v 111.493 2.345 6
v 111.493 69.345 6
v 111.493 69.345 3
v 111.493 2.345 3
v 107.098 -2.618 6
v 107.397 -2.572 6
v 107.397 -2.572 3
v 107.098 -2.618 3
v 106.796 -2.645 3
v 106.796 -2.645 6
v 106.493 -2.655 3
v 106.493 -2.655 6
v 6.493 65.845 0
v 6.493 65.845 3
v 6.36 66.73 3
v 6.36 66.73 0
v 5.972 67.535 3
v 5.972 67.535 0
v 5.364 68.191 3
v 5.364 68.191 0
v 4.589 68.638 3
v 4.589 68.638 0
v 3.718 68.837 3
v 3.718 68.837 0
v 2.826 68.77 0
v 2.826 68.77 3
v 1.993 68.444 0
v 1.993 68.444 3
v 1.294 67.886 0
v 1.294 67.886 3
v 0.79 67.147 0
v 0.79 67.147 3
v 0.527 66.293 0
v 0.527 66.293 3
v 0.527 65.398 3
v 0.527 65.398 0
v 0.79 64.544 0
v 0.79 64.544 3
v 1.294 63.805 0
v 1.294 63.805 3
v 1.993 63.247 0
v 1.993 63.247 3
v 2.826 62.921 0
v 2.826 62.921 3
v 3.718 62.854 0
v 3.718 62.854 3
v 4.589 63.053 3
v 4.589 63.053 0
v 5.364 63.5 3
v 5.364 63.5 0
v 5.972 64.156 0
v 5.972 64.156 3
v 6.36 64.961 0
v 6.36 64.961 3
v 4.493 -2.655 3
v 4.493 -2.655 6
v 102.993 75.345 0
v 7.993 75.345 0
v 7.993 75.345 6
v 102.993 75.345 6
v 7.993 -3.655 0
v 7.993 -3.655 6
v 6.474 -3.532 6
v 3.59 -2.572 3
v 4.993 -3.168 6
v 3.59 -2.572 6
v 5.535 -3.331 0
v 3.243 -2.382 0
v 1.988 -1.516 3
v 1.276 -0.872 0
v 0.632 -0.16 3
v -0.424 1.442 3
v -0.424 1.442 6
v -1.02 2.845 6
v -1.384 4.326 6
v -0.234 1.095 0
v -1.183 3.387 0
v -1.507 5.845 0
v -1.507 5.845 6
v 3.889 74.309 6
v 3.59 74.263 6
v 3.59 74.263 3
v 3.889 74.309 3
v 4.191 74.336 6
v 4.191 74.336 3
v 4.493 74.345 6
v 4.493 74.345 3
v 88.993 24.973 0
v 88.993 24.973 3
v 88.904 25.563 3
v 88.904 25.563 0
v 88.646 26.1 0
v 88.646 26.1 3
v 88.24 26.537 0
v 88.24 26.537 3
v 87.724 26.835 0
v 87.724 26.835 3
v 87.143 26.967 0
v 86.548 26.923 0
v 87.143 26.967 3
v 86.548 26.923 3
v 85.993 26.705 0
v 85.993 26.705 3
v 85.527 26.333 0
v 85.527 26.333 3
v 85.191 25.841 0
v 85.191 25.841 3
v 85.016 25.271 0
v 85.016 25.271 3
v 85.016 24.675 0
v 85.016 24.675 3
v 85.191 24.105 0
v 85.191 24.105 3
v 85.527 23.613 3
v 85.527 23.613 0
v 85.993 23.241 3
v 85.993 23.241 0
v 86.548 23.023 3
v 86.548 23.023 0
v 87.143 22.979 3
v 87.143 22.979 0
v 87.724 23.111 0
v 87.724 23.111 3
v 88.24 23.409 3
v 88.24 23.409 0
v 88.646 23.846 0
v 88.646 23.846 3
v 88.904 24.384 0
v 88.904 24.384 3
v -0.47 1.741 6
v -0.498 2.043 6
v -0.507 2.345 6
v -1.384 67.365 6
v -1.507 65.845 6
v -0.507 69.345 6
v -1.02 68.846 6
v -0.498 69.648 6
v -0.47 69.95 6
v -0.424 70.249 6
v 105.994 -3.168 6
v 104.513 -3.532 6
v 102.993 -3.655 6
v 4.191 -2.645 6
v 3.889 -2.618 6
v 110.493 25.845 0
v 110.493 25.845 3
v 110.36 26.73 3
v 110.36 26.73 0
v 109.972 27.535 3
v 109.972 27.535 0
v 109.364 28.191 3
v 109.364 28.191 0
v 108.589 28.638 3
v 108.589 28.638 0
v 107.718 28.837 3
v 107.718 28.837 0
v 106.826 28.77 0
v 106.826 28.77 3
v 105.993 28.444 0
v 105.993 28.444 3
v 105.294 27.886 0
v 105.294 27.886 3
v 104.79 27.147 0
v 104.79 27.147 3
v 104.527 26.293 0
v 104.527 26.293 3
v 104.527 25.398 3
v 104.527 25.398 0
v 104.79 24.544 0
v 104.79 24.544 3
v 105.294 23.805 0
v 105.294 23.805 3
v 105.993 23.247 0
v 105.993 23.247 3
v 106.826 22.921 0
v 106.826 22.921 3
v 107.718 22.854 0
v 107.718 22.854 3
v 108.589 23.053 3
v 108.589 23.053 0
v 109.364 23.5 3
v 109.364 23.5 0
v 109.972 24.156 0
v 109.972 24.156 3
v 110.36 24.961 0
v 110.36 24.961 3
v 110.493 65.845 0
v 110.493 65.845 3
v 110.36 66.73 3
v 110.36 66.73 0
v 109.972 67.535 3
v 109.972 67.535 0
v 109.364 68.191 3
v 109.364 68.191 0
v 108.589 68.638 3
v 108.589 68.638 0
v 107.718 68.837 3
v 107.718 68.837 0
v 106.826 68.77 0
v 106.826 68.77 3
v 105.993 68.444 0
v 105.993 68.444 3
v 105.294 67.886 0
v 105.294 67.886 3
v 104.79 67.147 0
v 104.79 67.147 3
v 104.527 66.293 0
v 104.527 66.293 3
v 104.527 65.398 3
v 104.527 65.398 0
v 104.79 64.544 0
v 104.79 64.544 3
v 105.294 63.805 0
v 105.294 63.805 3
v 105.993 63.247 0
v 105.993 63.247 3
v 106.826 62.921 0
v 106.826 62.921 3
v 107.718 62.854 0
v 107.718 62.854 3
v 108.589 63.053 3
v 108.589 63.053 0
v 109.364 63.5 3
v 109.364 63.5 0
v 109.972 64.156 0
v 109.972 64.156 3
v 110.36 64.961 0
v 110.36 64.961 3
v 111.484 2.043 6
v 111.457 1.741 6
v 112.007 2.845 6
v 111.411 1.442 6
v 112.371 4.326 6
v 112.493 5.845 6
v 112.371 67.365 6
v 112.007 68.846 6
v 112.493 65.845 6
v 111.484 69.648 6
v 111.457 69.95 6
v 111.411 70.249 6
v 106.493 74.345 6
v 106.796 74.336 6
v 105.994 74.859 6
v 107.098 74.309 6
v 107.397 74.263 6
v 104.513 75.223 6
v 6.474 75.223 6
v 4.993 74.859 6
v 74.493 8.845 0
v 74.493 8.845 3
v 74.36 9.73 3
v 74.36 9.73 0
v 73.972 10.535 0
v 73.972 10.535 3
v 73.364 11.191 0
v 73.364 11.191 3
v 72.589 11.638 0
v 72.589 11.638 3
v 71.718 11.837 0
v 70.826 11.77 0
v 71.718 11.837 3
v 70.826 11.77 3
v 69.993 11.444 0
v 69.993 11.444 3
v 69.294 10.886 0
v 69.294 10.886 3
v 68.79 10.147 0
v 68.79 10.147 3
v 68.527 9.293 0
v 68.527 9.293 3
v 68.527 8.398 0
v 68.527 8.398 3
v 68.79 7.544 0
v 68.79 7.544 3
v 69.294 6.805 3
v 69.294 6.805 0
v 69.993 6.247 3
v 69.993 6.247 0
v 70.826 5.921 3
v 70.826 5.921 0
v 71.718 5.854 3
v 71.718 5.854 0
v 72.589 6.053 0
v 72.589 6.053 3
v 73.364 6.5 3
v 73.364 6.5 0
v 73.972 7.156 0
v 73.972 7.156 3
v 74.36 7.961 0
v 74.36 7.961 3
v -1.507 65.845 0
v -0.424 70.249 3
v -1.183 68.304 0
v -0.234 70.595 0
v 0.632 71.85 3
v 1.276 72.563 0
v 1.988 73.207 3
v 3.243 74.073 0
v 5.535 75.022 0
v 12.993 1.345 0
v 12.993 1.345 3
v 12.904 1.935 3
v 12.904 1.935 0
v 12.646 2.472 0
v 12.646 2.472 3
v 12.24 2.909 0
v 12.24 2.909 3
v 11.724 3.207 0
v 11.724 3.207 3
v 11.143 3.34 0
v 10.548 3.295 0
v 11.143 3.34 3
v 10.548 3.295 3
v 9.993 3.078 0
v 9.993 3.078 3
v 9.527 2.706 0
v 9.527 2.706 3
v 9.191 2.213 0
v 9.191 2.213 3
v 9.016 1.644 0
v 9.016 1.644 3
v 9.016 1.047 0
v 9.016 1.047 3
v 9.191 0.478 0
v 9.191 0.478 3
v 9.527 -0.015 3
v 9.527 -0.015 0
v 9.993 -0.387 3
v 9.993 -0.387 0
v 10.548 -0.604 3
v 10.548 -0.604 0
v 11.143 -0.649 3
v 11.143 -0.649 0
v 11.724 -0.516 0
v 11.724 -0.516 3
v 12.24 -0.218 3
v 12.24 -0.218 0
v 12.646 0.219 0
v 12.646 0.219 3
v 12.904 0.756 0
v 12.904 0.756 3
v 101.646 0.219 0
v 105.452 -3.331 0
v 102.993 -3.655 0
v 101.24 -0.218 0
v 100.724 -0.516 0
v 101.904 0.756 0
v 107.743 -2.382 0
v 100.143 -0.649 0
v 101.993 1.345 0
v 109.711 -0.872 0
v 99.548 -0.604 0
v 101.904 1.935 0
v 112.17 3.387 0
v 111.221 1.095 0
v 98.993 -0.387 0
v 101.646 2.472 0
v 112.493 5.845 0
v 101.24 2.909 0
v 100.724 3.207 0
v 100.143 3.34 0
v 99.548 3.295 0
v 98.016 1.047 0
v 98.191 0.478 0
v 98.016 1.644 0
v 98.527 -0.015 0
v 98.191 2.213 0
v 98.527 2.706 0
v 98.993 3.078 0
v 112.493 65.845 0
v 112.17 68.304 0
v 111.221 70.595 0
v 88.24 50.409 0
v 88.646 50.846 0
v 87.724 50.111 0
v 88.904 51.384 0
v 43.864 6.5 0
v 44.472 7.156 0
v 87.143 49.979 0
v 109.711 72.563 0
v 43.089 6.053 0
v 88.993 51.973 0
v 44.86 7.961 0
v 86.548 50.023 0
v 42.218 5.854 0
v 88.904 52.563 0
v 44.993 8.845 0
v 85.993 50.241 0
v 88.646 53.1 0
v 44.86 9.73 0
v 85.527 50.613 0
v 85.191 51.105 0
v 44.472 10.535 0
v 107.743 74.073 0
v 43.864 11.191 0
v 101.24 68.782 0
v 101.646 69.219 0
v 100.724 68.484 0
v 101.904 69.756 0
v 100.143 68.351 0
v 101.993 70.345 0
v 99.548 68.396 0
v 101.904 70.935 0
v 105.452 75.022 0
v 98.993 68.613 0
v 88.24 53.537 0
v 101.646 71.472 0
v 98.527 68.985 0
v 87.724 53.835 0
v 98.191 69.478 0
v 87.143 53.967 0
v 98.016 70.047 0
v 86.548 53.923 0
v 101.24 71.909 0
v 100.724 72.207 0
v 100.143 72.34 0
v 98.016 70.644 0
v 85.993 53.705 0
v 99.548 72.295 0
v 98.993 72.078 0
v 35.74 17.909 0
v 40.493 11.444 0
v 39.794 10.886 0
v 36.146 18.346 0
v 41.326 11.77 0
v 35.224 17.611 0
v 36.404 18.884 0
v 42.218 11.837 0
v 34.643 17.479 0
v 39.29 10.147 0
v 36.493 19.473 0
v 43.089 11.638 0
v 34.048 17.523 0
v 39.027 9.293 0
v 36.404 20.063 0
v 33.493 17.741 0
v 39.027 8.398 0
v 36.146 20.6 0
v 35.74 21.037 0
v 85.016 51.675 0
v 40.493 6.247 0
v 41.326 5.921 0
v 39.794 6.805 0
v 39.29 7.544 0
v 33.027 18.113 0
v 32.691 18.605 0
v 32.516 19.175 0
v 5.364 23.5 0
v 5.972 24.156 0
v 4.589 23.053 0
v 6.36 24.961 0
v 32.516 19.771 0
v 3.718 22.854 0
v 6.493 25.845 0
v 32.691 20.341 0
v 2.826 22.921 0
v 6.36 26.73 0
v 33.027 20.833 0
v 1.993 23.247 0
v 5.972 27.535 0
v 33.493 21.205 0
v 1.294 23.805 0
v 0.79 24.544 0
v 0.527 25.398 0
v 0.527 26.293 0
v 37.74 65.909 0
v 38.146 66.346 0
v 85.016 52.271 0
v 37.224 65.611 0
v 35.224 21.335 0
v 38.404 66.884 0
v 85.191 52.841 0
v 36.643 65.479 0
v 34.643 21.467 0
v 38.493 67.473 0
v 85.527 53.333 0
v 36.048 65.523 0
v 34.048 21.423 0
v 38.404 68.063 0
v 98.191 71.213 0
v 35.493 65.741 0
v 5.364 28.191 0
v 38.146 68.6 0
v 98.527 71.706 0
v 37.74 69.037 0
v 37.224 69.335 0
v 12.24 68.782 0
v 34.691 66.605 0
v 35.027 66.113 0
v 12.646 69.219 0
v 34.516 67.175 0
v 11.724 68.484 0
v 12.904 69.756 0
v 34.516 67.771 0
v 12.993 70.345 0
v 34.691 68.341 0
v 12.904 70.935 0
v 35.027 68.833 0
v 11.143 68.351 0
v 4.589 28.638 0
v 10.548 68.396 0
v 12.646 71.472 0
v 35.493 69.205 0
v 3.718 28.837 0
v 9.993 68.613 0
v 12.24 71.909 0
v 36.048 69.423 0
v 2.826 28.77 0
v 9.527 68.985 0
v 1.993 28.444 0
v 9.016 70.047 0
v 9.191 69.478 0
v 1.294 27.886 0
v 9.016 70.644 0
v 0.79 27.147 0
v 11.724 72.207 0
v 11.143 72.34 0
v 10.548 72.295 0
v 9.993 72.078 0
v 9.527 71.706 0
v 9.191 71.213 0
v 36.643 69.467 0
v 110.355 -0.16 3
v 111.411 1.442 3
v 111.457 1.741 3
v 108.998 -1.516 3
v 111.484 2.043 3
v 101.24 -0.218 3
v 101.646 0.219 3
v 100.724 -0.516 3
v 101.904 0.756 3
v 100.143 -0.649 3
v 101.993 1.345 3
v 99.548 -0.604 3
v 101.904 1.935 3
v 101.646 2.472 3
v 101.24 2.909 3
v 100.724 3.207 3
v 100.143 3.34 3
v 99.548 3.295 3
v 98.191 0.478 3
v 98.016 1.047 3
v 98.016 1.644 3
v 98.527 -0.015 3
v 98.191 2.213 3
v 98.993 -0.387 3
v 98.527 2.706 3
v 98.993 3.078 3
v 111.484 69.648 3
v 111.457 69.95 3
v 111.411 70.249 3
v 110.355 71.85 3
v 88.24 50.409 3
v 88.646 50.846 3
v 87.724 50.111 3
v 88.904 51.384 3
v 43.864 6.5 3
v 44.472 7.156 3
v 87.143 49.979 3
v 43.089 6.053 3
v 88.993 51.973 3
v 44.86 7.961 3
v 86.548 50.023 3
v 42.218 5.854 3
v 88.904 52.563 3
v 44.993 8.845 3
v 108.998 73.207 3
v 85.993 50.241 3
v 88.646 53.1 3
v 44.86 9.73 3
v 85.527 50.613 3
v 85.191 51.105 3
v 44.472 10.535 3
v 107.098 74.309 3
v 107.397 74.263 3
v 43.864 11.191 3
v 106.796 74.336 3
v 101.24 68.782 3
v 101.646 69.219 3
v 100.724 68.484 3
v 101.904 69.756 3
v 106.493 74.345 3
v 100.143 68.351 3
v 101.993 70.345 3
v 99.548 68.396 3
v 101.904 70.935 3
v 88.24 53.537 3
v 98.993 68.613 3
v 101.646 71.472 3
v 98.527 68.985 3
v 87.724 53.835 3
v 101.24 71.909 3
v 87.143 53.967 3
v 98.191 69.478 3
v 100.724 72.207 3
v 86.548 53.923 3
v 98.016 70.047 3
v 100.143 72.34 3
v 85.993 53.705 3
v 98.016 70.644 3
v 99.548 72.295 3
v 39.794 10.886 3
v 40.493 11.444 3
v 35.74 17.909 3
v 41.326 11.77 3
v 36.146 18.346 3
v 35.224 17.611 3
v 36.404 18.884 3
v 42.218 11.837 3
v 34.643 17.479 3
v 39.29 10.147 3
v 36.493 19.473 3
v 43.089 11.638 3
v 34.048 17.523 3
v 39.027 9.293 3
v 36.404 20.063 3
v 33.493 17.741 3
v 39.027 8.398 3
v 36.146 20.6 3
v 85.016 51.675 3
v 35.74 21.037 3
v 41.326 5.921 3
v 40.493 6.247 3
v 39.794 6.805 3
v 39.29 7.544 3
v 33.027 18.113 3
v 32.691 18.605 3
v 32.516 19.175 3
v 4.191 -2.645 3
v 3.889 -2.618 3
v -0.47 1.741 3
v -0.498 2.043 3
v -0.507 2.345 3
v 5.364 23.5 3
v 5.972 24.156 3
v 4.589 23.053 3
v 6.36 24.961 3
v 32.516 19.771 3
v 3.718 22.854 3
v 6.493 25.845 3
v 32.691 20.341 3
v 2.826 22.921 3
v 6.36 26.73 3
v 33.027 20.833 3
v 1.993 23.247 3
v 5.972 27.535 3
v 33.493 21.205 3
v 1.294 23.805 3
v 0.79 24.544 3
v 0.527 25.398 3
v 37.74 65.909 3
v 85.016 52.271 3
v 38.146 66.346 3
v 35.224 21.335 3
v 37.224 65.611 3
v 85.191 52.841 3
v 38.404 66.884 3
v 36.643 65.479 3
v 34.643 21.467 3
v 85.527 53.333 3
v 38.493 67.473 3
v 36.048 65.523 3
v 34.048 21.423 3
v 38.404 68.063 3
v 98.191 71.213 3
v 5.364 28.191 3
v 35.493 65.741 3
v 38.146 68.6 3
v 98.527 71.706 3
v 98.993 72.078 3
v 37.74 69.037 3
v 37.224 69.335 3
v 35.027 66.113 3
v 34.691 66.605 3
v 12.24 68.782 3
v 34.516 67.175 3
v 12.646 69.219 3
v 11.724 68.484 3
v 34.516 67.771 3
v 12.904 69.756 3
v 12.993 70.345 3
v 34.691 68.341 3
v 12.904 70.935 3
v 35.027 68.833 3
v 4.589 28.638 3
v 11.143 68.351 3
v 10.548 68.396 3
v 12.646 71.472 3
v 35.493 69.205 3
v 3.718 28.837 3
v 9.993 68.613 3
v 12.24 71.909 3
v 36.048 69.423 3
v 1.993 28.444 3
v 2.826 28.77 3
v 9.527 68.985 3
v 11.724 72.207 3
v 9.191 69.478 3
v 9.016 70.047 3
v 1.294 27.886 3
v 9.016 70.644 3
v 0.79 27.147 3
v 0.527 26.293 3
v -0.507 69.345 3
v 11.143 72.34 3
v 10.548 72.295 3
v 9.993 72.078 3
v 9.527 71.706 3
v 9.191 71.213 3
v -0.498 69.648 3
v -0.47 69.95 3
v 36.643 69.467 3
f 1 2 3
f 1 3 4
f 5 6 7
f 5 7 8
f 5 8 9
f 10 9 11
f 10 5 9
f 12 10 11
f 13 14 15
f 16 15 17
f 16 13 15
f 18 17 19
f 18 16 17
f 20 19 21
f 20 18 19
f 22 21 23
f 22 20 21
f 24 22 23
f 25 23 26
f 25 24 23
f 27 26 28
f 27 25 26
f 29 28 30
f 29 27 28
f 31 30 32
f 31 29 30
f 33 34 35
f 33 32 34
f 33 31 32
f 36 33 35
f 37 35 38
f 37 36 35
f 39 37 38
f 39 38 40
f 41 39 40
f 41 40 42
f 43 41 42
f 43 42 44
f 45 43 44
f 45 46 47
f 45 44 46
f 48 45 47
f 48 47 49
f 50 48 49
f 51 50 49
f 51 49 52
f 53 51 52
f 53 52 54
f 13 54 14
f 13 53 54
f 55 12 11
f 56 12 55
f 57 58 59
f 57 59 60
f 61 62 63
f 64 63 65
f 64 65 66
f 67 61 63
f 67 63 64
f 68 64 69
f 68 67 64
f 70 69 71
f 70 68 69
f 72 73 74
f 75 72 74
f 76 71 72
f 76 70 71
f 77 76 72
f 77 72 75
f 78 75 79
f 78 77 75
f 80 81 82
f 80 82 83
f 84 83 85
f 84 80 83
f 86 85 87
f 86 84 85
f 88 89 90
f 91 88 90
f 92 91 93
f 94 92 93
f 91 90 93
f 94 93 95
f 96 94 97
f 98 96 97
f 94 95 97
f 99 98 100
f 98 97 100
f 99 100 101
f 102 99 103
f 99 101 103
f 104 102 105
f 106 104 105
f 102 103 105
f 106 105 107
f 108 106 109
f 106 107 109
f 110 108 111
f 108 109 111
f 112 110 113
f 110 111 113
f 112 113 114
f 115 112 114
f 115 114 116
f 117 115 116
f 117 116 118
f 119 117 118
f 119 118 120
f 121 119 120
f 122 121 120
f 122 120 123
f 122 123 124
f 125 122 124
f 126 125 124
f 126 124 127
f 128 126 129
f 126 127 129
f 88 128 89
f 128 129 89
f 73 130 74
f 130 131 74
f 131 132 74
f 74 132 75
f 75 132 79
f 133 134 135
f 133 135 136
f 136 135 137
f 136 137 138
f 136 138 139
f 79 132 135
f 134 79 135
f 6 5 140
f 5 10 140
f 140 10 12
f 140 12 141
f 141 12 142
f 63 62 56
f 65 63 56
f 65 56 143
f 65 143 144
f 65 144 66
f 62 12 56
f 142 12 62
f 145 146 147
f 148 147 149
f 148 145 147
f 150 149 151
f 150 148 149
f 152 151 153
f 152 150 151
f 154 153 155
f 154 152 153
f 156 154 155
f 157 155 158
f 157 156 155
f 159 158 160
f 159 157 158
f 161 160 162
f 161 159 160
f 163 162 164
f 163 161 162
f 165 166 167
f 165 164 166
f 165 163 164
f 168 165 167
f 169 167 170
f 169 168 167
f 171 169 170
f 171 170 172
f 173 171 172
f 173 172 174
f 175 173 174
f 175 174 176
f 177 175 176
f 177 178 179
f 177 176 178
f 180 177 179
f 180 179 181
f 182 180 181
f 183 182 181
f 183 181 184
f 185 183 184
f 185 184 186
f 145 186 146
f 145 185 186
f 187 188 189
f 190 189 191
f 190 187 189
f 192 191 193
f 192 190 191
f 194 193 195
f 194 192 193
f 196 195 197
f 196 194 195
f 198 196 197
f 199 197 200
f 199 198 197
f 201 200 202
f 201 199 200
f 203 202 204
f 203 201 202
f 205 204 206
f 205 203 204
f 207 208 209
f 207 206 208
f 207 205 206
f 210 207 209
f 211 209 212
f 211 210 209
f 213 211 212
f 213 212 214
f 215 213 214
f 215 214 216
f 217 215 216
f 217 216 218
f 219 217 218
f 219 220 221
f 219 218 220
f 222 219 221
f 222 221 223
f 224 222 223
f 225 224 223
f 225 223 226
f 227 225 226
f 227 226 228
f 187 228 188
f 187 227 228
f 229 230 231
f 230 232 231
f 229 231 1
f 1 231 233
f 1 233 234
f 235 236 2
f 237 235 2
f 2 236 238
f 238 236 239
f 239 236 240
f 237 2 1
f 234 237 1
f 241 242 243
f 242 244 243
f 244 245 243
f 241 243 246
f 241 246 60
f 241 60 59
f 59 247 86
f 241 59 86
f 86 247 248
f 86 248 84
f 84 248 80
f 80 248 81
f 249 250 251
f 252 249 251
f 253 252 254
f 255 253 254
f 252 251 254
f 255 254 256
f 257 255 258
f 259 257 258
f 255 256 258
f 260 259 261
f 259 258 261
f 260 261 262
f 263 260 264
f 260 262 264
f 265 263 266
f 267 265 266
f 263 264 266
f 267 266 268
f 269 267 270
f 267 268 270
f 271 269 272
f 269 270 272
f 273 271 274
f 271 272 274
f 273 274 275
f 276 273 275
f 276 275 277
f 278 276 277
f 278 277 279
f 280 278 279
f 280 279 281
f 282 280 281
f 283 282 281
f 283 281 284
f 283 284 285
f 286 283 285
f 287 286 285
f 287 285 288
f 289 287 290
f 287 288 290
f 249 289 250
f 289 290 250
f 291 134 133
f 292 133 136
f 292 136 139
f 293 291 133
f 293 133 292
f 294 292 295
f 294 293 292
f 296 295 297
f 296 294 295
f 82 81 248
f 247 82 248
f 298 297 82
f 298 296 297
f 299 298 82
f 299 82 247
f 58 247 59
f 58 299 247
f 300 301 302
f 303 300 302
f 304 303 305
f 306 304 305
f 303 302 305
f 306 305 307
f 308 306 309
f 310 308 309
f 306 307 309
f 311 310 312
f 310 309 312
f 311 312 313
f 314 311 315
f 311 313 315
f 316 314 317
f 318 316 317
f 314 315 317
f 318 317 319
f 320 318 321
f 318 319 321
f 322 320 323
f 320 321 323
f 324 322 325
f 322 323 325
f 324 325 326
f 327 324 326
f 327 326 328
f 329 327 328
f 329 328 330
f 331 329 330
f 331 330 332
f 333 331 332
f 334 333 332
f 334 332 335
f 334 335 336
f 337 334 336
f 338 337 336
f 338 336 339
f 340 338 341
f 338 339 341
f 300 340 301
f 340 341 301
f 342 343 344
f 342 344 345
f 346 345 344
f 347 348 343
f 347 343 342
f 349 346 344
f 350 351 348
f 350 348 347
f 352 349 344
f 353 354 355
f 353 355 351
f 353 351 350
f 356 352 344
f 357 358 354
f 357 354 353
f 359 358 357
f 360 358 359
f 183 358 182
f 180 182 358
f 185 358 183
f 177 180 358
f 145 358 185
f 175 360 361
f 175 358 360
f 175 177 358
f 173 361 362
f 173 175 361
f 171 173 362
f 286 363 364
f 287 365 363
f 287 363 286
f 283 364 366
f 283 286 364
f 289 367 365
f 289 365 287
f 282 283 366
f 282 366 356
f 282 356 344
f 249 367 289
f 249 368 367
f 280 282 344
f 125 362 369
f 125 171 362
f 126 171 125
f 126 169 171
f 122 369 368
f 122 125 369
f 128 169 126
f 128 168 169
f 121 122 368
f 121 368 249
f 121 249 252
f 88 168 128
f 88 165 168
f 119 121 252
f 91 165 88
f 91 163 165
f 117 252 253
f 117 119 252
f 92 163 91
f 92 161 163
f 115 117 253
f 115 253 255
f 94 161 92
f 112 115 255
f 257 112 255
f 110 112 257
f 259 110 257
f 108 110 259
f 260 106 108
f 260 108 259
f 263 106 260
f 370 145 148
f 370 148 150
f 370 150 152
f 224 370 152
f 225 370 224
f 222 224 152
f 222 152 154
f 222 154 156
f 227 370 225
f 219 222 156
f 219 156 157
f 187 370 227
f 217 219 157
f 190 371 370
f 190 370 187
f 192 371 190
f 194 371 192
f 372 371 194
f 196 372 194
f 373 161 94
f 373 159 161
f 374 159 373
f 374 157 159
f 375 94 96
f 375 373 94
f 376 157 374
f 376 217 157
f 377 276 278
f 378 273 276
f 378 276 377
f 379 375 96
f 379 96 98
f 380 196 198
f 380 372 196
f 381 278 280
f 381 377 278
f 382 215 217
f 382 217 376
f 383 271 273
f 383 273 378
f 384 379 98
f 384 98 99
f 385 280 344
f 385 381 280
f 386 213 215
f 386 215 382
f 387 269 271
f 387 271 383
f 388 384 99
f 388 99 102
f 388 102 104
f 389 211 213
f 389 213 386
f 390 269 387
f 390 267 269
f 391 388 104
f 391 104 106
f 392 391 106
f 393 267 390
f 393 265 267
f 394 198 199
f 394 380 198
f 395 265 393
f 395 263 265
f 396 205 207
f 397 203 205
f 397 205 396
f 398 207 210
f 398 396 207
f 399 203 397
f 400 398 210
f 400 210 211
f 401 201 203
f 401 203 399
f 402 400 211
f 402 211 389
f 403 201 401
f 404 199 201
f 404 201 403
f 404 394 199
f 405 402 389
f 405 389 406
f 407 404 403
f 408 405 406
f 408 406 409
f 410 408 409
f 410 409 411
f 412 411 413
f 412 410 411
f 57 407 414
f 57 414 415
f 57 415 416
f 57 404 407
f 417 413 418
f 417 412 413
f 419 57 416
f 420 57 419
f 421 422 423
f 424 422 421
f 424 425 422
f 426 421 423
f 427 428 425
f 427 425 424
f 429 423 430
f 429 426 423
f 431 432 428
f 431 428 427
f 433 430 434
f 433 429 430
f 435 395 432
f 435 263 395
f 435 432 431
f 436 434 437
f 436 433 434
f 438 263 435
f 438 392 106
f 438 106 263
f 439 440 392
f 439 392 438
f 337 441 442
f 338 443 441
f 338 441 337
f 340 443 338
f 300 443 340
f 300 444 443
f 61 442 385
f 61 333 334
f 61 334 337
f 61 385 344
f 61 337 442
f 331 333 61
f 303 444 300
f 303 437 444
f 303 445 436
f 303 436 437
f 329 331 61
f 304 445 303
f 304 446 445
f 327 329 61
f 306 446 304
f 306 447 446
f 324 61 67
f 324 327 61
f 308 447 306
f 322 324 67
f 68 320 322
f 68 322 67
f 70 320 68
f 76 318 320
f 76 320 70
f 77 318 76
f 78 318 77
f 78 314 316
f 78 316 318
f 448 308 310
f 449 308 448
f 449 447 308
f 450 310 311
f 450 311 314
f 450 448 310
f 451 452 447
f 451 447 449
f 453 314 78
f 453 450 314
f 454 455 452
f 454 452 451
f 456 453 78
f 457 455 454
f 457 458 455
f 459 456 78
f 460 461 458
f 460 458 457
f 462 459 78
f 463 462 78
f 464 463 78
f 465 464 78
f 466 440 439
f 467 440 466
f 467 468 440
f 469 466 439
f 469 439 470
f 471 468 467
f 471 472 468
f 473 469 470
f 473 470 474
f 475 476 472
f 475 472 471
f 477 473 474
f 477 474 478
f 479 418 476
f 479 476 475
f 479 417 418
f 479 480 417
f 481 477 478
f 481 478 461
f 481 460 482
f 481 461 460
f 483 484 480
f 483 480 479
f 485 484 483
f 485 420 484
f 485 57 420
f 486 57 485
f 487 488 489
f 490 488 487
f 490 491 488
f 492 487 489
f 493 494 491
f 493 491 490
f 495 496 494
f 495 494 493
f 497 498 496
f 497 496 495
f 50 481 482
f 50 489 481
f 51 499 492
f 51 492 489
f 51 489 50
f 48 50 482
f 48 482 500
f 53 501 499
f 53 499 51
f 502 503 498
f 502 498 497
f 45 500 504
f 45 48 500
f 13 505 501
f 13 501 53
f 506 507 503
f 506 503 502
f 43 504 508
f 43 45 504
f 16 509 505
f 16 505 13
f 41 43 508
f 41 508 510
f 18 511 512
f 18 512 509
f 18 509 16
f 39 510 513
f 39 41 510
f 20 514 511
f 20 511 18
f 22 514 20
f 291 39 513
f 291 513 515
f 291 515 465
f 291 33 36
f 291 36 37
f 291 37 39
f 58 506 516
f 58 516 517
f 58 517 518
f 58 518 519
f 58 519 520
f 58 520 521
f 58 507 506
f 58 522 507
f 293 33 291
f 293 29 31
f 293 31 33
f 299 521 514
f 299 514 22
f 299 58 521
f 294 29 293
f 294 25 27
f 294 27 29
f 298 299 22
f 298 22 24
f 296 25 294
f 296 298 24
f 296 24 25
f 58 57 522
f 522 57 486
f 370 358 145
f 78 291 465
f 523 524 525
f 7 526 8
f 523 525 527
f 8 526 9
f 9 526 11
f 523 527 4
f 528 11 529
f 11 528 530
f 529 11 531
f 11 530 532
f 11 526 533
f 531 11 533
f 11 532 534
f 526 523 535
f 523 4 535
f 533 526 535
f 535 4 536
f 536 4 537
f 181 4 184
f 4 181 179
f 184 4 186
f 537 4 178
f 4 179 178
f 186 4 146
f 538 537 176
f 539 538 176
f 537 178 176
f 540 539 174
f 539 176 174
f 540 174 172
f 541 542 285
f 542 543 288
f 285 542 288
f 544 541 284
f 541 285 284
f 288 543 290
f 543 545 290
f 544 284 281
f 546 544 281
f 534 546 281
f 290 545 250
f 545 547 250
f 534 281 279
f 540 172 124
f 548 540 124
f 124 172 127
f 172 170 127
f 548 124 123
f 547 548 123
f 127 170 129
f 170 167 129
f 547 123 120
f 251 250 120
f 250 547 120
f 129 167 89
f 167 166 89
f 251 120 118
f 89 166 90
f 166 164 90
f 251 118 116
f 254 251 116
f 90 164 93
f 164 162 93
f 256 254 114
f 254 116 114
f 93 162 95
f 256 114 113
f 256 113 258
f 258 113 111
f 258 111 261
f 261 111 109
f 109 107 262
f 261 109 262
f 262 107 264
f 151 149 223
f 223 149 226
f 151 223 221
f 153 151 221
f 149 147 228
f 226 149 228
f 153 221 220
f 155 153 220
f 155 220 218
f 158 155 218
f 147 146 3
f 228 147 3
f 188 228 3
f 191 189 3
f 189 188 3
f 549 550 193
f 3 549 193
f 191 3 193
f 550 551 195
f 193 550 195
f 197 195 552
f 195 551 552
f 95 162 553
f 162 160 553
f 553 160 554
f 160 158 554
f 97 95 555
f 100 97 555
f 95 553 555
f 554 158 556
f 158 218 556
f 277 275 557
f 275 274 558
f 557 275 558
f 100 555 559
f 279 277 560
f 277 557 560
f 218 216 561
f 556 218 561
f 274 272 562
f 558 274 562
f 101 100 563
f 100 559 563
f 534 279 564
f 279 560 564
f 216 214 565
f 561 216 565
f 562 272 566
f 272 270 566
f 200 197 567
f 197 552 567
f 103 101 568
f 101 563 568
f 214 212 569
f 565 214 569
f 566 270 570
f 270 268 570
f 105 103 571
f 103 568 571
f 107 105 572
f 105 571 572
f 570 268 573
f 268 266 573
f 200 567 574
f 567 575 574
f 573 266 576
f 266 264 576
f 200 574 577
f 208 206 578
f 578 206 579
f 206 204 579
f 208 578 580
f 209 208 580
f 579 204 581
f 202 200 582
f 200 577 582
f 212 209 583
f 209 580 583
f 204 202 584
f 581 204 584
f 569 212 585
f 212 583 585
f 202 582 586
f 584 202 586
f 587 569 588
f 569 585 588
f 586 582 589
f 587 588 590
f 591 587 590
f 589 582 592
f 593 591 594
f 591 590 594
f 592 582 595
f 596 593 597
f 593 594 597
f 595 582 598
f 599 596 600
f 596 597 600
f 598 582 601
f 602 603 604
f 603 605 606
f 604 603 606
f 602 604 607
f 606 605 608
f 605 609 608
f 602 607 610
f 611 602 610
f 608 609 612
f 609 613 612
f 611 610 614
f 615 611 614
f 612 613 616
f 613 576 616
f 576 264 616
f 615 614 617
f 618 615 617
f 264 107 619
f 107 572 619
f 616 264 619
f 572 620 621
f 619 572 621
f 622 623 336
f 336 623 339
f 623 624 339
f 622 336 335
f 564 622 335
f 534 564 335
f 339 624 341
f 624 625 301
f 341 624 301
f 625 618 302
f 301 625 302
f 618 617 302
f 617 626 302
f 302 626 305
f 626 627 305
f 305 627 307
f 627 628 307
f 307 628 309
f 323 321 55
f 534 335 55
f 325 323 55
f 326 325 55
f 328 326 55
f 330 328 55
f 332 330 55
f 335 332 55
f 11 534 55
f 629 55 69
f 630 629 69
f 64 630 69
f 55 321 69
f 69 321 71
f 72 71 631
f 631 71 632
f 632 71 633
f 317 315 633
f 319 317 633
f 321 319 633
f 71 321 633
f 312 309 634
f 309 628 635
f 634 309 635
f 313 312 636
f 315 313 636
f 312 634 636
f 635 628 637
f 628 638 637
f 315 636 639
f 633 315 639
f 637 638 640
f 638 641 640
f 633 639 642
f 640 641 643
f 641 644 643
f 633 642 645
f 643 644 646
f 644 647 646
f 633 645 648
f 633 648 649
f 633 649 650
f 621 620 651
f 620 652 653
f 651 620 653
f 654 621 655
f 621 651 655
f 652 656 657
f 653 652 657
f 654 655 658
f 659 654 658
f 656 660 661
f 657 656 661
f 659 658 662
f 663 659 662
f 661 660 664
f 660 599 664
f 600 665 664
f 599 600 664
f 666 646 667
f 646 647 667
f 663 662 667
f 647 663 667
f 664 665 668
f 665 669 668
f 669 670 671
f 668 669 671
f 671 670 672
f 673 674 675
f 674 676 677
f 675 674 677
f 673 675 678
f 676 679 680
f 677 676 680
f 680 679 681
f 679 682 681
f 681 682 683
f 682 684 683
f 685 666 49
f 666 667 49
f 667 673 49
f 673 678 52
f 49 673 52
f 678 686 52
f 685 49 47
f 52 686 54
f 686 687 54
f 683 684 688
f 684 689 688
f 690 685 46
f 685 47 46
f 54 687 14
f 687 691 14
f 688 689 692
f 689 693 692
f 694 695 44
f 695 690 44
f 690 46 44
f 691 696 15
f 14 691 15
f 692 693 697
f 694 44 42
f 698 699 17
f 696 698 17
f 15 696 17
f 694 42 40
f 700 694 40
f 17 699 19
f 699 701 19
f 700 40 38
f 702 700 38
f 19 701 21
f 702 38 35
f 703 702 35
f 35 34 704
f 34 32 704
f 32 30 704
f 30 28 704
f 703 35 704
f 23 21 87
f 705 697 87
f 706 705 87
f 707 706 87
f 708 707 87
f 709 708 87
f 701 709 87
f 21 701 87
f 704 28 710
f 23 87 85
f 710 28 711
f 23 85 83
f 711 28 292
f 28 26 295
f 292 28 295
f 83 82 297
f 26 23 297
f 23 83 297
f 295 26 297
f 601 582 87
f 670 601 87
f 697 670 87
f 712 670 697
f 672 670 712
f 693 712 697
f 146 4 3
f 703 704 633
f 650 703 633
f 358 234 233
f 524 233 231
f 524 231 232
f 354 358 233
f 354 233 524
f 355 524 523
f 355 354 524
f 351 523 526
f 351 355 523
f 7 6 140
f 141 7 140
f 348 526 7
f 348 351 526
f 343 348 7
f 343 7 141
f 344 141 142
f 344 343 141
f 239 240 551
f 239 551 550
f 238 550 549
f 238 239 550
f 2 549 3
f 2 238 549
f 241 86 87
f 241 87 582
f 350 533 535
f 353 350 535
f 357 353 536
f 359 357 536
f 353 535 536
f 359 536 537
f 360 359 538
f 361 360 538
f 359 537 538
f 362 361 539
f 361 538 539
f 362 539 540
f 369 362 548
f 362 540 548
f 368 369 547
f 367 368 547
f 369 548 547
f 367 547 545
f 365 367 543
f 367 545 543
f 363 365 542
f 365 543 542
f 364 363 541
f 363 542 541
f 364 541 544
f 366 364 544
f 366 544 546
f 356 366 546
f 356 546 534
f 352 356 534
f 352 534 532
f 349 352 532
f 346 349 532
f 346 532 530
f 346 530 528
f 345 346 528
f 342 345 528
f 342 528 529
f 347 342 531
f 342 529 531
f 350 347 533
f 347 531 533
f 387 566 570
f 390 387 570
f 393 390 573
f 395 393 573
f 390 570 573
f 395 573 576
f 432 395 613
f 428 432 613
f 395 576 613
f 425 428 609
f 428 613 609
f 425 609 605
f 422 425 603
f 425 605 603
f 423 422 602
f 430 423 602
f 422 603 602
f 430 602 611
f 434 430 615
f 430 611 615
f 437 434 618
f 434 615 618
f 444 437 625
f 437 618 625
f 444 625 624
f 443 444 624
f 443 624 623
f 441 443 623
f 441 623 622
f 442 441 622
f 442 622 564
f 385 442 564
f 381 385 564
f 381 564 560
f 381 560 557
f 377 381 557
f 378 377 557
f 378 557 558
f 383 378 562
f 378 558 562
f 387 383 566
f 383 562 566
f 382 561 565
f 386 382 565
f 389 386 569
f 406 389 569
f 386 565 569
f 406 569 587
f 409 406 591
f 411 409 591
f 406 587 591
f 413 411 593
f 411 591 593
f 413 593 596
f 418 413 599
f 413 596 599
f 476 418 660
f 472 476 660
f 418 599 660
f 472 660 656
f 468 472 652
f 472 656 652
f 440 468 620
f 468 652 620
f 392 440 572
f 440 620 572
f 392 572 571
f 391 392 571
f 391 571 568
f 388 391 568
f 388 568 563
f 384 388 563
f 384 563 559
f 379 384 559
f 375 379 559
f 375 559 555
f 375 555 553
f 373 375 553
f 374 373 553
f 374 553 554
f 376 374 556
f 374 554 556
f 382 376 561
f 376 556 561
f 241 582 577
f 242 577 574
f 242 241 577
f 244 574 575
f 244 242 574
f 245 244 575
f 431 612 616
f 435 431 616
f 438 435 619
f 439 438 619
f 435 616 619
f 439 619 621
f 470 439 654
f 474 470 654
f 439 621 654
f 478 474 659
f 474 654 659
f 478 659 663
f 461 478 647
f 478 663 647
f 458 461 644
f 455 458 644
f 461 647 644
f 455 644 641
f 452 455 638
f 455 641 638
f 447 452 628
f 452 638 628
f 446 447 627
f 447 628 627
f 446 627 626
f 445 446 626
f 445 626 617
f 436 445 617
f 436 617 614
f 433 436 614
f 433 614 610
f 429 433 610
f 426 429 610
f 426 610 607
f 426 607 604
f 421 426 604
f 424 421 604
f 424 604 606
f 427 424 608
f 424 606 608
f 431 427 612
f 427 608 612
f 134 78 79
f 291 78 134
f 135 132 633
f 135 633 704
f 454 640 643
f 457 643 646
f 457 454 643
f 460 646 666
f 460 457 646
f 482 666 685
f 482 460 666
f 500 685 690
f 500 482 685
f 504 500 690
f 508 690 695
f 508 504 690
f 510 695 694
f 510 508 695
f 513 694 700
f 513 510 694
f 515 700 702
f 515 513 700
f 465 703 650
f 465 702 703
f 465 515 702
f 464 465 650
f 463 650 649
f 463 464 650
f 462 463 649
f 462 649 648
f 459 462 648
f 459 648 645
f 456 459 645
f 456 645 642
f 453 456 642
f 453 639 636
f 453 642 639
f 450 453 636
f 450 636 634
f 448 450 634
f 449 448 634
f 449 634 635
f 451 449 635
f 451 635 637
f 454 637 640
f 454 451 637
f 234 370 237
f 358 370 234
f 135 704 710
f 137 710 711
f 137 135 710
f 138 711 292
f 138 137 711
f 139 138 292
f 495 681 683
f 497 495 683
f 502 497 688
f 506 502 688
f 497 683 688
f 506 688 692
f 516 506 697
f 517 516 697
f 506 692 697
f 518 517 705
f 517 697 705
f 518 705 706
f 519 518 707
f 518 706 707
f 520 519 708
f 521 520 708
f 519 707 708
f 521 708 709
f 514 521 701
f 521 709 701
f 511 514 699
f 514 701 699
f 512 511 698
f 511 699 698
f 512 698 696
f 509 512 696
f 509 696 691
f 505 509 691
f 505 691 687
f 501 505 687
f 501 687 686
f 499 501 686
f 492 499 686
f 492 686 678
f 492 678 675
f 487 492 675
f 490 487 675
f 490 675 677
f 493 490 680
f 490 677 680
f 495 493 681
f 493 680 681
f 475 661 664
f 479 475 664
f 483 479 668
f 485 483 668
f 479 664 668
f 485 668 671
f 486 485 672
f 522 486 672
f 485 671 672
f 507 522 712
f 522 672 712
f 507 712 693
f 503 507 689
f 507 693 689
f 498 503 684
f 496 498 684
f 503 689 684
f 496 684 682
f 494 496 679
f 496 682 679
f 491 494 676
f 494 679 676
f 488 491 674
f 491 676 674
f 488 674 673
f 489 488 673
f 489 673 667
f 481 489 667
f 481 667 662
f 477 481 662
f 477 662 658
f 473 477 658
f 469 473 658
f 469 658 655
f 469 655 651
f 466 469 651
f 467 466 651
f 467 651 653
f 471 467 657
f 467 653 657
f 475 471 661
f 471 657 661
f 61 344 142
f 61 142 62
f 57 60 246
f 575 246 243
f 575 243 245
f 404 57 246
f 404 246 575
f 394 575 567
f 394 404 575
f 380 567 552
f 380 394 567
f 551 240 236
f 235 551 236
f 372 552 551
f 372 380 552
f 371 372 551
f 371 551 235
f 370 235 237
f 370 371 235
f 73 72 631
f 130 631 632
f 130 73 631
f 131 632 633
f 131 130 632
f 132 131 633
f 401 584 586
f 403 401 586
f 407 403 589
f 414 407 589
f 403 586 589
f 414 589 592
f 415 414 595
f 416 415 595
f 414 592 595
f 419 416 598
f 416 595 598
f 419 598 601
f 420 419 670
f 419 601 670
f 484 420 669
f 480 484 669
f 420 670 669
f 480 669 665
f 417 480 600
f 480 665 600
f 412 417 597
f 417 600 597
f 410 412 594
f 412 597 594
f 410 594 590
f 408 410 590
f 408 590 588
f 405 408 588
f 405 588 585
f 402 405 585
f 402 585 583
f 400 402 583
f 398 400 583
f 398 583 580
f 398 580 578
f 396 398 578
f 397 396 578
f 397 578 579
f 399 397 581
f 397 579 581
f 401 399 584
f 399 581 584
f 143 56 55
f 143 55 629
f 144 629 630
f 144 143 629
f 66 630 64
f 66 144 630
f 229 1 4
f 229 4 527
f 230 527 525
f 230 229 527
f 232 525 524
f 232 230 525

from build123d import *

# Parameters (mm, degrees)
ESQUISSE1_R             = 3
BOSS_EXTRU_3_DEPTH      = 6
ENL_V_MAT_EXTRU_2_DEPTH = 3
ESQUISSE5_R             = 2
ESQUISSE5_R_2           = 3
ENL_V_MAT_EXTRU_3_DEPTH = 3


with BuildPart() as part:
    # Esquisse1 → Boss.-Extru.3 (new body)
    with BuildSketch(Plane.XY):
        with BuildLine():
            Line((7.993323256, 75.345483427), (102.993323256, 75.345483427))
            ThreePointArc((102.993323256, 75.345483427), (109.710837677, 72.562997848), (112.493323256, 65.845483427))
            Line((112.493323256, 65.845483427), (112.493323256, 5.845483427))
            ThreePointArc((112.493323256, 5.845483427), (109.710837677, -0.872030995), (102.993323256, -3.654516573))
            Line((102.993323256, -3.654516573), (7.993323256, -3.654516573))
            ThreePointArc((7.993323256, -3.654516573), (1.275808835, -0.872030995), (-1.506676744, 5.845483427))
            Line((-1.506676744, 5.845483427), (-1.506676744, 65.845483427))
            ThreePointArc((-1.506676744, 65.845483427), (1.275808835, 72.562997848), (7.993323256, 75.345483427))
        make_face()
        with Locations((107.493323256, 65.845483427)):
            Circle(ESQUISSE1_R, mode=Mode.SUBTRACT)
        with Locations((107.493323256, 25.845483427)):
            Circle(ESQUISSE1_R, mode=Mode.SUBTRACT)
        with Locations((3.493323256, 65.845483427)):
            Circle(ESQUISSE1_R, mode=Mode.SUBTRACT)
        with Locations((3.493323256, 25.845483427)):
            Circle(ESQUISSE1_R, mode=Mode.SUBTRACT)
    extrude(amount=BOSS_EXTRU_3_DEPTH)

    # Esquisse3 → Enlèv. mat.-Extru.2 (cut)
    with BuildSketch(Plane.XY.offset(6)):
        with BuildLine():
            Line((4.493323256, 74.345483427), (106.493323256, 74.345483427))
            ThreePointArc((106.493323256, 74.345483427), (110.028857162, 72.881017333), (111.493323256, 69.345483427))
            Line((111.493323256, 69.345483427), (111.493323256, 2.345483427))
            ThreePointArc((111.493323256, 2.345483427), (110.028857162, -1.190050479), (106.493323256, -2.654516573))
            Line((106.493323256, -2.654516573), (4.493323256, -2.654516573))
            ThreePointArc((4.493323256, -2.654516573), (0.95778935, -1.190050479), (-0.506676744, 2.345483427))
            Line((-0.506676744, 2.345483427), (-0.506676744, 69.345483427))
            ThreePointArc((-0.506676744, 69.345483427), (0.95778935, 72.881017333), (4.493323256, 74.345483427))
        make_face()
    extrude(amount=-ENL_V_MAT_EXTRU_2_DEPTH, mode=Mode.SUBTRACT)

    # Esquisse5 → Enlèv. mat.-Extru.3 (cut)
    with BuildSketch(Plane.XY.offset(3)):
        with Locations((10.993323256, 70.345483427)):
            Circle(ESQUISSE5_R)
        with Locations((99.993323256, 70.345483427)):
            Circle(ESQUISSE5_R)
        with Locations((10.993323256, 1.345483427)):
            Circle(ESQUISSE5_R)
        with Locations((99.993323256, 1.345483427)):
            Circle(ESQUISSE5_R)
        with Locations((41.993323256, 8.845483427)):
            Circle(ESQUISSE5_R_2)
        with Locations((71.493323256, 8.845483427)):
            Circle(ESQUISSE5_R_2)
        with Locations((36.493323256, 67.473019046)):
            Circle(ESQUISSE5_R)
        with Locations((34.493323256, 19.473019046)):
            Circle(ESQUISSE5_R)
        with Locations((86.993323256, 51.973019046)):
            Circle(ESQUISSE5_R)
        with Locations((86.993323256, 24.973019046)):
            Circle(ESQUISSE5_R)
    extrude(amount=-ENL_V_MAT_EXTRU_3_DEPTH, mode=Mode.SUBTRACT)


solid = part.part
